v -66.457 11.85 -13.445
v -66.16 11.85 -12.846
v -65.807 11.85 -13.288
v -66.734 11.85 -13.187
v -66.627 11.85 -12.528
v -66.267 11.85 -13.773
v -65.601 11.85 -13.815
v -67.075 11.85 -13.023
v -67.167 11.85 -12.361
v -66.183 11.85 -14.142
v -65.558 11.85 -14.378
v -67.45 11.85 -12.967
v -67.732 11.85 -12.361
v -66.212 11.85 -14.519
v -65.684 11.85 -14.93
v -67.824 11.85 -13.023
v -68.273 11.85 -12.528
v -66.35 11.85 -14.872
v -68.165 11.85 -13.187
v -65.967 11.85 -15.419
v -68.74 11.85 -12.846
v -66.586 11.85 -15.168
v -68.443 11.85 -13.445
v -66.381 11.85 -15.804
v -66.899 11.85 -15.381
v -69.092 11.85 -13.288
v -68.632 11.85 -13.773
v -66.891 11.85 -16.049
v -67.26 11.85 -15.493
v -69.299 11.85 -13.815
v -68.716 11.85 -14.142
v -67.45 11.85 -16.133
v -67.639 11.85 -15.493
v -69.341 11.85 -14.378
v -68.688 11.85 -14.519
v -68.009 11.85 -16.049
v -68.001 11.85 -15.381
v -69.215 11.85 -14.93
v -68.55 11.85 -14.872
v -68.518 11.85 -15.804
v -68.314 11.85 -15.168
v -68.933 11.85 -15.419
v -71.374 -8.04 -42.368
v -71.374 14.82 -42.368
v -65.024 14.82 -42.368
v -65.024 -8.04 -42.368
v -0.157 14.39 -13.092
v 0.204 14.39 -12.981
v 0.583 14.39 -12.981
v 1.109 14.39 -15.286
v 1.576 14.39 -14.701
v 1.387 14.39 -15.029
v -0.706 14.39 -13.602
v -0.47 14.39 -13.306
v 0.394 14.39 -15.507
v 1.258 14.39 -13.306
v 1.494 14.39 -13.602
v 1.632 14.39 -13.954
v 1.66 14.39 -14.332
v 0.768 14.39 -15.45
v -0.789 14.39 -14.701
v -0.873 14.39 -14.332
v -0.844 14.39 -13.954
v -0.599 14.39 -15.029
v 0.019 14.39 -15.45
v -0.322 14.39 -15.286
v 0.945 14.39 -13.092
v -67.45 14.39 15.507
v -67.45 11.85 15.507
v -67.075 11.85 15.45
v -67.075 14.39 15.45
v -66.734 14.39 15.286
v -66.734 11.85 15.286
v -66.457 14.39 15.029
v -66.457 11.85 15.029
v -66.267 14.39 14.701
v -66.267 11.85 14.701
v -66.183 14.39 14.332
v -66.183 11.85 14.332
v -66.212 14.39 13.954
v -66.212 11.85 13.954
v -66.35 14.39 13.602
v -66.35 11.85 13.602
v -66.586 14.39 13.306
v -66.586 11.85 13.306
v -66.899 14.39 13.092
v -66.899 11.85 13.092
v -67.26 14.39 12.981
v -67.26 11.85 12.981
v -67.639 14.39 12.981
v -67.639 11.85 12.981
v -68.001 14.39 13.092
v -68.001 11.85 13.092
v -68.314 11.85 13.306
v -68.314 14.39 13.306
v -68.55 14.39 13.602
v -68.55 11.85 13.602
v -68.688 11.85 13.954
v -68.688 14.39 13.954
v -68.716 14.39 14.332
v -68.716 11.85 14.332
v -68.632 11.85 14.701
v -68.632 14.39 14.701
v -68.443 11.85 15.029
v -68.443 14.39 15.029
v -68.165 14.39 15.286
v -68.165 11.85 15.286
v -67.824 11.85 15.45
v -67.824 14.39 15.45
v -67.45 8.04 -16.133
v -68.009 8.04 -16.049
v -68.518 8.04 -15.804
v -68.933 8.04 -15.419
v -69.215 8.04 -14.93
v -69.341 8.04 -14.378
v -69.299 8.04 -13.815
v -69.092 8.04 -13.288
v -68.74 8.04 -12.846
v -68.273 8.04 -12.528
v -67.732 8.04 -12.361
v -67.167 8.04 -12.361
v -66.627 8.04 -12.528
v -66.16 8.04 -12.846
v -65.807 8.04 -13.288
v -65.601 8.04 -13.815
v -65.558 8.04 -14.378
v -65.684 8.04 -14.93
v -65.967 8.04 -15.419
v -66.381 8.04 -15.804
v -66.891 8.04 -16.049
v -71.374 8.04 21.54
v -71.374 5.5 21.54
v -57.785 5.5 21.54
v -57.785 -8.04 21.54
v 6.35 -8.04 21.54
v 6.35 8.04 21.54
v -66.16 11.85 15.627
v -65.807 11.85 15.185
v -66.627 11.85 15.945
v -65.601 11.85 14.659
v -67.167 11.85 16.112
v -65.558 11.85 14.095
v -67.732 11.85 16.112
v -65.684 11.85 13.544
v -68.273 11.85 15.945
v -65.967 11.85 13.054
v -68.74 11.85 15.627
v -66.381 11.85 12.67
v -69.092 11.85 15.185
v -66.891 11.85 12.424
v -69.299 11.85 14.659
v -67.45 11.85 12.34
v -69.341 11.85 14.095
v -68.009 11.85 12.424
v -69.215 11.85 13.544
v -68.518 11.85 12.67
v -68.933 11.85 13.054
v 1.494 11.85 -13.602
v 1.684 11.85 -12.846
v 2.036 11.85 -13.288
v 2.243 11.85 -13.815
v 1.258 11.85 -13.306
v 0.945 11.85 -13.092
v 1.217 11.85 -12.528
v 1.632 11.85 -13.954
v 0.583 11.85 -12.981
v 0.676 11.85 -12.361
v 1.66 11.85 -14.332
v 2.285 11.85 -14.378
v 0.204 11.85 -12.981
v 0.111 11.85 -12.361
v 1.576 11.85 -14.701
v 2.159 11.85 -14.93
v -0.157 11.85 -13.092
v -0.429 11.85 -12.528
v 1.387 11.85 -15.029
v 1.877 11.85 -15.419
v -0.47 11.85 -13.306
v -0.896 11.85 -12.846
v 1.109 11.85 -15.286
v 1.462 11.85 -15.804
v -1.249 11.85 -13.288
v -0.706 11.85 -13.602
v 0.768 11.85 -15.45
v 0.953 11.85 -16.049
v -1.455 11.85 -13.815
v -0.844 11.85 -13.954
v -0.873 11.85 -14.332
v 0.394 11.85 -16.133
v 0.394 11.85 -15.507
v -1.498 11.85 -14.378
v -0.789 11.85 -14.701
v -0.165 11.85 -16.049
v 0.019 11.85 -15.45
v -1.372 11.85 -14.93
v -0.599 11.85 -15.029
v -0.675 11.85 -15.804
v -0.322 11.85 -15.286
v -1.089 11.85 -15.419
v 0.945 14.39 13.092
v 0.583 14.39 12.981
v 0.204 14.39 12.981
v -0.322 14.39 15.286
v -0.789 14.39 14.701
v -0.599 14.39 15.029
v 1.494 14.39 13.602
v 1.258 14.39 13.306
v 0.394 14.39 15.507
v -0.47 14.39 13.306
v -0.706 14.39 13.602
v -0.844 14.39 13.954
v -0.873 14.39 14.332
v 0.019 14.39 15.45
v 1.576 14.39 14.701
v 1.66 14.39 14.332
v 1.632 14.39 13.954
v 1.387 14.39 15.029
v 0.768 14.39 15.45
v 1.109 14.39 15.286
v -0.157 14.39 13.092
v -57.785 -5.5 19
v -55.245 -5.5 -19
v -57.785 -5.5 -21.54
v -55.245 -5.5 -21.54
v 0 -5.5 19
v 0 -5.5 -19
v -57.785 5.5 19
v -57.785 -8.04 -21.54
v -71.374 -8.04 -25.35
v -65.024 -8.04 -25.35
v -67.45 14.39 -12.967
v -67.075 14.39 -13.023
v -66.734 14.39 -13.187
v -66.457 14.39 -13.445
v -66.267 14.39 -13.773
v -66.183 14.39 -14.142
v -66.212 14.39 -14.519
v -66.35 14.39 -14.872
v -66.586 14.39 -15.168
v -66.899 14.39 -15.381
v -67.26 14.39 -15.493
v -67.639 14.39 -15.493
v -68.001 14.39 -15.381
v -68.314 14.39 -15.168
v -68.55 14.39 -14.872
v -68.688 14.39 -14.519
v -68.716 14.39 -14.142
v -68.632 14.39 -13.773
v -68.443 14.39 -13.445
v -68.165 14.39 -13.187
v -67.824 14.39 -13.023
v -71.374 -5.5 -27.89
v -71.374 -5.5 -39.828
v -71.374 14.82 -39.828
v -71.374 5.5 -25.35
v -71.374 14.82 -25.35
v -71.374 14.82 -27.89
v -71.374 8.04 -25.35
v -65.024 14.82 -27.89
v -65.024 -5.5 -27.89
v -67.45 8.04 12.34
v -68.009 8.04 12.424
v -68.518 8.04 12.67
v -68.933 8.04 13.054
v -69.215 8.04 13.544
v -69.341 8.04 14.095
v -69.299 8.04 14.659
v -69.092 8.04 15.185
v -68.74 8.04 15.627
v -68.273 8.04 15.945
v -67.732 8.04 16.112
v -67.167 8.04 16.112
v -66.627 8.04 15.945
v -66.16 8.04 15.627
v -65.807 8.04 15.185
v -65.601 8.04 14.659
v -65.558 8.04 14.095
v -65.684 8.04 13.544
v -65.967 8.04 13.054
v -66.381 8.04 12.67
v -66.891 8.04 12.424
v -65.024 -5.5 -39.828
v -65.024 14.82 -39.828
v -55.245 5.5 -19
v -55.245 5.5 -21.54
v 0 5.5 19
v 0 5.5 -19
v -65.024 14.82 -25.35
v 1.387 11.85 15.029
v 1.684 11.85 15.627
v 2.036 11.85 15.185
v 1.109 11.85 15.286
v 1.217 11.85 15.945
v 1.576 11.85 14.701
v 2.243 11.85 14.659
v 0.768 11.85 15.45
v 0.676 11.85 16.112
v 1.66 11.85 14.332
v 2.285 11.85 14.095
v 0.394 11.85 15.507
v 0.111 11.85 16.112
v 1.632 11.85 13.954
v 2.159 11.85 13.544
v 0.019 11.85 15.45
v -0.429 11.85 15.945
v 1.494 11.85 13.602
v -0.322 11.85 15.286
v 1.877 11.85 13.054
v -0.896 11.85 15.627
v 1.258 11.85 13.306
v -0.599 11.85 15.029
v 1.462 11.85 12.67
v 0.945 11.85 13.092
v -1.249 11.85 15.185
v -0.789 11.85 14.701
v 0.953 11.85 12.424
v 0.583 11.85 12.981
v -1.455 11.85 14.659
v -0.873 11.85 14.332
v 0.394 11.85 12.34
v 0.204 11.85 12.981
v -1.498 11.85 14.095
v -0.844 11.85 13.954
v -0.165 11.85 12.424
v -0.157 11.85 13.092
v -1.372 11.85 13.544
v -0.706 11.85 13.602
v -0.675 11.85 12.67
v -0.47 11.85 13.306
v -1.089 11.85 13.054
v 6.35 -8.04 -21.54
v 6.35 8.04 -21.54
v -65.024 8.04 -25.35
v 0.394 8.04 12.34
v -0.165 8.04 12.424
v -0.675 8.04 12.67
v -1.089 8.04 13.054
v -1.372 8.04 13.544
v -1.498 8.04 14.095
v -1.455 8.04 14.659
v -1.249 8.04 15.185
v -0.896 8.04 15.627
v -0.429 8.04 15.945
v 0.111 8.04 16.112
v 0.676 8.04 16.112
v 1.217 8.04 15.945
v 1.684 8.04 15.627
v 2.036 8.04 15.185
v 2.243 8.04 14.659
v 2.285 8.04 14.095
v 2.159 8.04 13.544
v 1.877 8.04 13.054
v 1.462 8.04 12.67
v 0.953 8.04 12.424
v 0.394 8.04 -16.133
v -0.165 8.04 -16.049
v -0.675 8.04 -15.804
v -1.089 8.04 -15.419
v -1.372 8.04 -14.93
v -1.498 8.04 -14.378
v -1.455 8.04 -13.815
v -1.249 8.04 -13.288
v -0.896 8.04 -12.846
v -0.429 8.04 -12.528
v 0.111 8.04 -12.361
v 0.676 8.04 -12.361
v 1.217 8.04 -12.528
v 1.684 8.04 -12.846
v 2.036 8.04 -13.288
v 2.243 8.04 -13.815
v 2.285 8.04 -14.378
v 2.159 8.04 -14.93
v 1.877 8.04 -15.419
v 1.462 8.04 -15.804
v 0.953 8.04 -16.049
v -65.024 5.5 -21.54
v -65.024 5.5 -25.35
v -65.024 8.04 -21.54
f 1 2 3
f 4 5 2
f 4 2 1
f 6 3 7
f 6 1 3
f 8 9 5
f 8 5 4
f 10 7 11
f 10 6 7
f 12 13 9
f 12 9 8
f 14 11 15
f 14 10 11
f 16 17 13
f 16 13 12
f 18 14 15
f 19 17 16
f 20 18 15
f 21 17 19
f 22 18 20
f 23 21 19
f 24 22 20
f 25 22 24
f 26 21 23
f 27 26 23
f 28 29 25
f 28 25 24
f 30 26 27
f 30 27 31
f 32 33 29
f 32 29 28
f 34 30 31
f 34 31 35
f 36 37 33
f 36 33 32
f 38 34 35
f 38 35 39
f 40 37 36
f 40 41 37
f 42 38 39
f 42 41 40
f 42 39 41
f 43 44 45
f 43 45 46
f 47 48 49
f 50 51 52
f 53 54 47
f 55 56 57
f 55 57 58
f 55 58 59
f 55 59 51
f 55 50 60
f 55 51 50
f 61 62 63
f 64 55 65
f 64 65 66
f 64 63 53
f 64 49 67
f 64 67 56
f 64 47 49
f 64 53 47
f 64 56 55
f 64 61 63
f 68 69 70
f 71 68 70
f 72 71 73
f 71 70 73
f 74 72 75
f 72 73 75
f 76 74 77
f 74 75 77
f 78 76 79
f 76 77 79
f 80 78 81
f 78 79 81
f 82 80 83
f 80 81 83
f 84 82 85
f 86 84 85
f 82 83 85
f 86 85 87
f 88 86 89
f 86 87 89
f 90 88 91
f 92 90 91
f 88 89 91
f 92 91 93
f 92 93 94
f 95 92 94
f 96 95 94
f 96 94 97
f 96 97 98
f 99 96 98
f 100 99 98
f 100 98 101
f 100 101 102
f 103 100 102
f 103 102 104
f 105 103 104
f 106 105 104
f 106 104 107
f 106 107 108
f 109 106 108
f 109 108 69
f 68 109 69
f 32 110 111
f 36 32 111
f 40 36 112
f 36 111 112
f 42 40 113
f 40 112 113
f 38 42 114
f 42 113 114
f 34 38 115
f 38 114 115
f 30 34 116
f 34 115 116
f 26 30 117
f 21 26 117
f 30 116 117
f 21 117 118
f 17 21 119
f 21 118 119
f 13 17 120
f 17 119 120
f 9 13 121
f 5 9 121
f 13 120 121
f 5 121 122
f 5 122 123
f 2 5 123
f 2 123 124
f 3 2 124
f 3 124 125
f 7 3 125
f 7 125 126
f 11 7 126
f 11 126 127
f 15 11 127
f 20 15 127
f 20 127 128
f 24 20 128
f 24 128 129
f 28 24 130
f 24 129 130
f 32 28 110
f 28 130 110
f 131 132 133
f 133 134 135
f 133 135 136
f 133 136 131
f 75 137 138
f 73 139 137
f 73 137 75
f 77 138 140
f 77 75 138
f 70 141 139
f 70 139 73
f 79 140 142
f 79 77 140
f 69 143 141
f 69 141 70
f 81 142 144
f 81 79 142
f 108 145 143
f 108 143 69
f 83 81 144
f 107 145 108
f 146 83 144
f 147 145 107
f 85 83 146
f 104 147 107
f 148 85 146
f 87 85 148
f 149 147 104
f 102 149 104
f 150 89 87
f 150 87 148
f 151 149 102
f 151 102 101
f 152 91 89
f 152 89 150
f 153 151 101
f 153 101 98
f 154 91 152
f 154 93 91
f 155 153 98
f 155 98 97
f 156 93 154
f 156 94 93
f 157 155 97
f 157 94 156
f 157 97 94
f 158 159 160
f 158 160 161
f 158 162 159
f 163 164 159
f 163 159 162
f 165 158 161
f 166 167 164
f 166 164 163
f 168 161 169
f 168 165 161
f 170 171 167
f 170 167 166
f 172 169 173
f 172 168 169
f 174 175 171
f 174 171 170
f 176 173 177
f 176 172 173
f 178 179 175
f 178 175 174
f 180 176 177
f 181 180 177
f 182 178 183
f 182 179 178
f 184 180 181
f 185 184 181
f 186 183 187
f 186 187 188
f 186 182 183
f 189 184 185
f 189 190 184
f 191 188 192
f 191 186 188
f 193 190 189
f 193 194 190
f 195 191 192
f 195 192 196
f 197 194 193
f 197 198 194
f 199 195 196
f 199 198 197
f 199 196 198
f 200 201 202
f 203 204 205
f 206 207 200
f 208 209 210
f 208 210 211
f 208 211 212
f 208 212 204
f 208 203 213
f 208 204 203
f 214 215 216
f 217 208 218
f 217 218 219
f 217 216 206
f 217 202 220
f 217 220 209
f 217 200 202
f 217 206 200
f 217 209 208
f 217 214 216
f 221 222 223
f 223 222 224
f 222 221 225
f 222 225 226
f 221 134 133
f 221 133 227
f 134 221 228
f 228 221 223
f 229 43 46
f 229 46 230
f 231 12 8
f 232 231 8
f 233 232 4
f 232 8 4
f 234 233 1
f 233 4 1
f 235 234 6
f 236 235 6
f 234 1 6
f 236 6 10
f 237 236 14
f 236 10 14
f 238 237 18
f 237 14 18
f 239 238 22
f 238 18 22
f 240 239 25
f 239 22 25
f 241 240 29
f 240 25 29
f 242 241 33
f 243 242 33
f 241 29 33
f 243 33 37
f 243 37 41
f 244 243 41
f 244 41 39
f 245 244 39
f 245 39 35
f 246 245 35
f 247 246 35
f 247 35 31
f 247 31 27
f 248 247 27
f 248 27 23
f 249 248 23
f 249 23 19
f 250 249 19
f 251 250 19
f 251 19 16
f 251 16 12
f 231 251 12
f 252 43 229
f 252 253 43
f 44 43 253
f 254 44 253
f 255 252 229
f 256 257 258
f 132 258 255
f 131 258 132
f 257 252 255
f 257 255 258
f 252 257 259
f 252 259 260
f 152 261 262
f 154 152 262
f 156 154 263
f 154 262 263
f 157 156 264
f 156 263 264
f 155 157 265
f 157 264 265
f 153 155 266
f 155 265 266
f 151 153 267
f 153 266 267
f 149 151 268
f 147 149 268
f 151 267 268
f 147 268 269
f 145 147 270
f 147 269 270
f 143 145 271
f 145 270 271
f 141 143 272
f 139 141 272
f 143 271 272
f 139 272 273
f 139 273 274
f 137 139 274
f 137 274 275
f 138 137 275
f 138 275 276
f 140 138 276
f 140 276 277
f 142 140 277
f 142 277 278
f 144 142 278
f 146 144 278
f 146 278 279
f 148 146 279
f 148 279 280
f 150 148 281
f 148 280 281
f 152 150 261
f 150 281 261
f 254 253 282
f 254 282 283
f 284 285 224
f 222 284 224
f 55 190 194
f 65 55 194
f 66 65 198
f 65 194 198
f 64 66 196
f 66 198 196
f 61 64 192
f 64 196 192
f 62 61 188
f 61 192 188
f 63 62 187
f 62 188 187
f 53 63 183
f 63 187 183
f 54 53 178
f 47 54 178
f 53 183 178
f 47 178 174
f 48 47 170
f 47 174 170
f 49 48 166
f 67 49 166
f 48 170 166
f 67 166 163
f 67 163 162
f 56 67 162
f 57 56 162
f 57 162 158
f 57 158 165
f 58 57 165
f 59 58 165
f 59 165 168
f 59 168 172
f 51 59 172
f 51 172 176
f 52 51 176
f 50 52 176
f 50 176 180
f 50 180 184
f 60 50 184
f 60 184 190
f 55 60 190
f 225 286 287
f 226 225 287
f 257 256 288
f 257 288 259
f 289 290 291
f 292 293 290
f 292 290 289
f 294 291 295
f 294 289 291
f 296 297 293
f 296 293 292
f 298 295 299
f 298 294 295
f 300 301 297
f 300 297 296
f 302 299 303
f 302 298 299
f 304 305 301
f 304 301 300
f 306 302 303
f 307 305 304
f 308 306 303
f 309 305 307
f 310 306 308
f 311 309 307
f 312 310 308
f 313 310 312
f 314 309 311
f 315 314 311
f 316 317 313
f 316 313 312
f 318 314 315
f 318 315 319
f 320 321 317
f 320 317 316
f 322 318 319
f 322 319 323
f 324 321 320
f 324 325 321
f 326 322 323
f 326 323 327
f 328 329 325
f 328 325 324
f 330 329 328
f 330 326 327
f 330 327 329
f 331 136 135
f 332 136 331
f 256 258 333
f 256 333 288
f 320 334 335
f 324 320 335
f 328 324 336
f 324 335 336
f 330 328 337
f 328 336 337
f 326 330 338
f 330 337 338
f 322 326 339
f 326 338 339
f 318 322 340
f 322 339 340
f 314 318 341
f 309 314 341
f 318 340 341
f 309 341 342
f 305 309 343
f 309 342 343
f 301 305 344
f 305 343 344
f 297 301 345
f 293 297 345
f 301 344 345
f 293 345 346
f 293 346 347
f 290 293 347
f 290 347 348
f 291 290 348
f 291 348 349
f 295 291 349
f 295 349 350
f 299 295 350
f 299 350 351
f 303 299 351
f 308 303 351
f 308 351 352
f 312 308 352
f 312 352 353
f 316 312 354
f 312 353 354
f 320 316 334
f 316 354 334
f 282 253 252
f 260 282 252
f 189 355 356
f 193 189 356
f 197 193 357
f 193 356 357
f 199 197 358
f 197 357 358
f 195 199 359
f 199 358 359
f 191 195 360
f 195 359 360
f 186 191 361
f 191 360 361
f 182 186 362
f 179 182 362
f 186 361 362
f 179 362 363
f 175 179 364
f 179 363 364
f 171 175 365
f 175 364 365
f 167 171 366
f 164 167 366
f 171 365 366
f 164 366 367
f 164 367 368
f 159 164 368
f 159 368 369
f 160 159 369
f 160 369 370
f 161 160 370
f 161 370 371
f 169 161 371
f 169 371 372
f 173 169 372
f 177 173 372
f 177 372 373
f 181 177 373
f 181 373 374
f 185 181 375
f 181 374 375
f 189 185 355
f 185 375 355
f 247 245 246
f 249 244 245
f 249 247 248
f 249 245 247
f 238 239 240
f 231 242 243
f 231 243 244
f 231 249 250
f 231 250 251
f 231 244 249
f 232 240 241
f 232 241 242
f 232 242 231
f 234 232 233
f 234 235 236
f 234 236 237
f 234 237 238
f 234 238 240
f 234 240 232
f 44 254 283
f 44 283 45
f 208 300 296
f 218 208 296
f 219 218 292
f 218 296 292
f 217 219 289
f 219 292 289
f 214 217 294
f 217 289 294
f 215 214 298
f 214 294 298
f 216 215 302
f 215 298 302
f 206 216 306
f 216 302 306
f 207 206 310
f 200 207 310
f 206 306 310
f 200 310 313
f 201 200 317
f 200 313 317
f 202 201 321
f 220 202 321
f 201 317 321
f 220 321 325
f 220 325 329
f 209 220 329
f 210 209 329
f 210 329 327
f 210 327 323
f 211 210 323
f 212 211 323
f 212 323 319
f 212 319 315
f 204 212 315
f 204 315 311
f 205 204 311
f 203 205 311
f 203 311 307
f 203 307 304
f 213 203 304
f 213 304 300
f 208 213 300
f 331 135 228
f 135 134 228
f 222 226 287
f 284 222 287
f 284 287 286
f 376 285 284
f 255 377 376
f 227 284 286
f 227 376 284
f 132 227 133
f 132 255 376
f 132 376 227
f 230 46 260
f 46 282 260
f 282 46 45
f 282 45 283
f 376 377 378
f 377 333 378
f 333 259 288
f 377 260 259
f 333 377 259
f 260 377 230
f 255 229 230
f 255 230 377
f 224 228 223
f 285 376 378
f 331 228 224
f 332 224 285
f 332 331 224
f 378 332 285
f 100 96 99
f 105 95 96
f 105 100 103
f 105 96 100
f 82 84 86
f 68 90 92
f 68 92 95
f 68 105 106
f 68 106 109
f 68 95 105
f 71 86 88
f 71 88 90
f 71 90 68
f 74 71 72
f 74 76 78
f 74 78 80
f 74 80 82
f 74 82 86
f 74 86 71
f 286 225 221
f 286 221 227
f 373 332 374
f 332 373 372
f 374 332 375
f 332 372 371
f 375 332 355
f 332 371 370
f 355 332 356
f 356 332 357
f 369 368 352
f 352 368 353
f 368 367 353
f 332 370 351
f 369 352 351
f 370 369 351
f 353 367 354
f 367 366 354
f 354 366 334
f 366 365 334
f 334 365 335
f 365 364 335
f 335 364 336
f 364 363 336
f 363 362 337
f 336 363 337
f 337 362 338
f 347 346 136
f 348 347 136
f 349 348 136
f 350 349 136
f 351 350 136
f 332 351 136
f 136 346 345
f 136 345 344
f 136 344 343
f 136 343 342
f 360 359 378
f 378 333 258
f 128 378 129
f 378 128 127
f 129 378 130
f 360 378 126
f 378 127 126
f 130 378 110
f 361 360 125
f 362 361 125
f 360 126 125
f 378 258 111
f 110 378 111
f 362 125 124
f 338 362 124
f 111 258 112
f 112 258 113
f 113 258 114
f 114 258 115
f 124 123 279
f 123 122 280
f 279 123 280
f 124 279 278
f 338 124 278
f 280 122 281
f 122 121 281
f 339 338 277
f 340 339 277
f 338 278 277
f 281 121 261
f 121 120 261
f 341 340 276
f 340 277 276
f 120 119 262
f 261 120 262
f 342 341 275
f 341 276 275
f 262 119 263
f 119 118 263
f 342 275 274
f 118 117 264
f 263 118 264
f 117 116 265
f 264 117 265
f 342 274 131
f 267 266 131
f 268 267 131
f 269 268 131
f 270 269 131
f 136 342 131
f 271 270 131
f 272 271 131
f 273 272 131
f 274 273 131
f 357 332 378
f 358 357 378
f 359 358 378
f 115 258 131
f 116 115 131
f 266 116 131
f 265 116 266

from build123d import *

# Parameters (mm, degrees)
SKETCH1_W            = 43.08
SKETCH1_H            = 16.08
SKETCH1_W_2          = 38
SKETCH1_H_2          = 11
BOSS_EXTRUDE1_DEPTH  = 57.785
SKETCH1_2_W          = 43.08
SKETCH1_2_H          = 16.08
BOSS_EXTRUDE2_DEPTH  = 2.54
CUT_EXTRUDE2_DEPTH   = 2.54
SKETCH5_W            = 72.136
SKETCH5_H            = 43.08
BOSS_EXTRUDE8_DEPTH  = 2.54
SKETCH5_6_R          = 1.27
BOSS_EXTRUDE9_DEPTH  = 6.35
SKETCH5_8_R          = 1.896612794
SKETCH5_8_R_2        = 1.27
BOSS_EXTRUDE10_DEPTH = 3.81
SKETCH6_W            = 43.08
SKETCH6_H            = 16.08
BOSS_EXTRUDE11_DEPTH = 3.81
SKETCH7_W            = 43.08
SKETCH7_H            = 2.54
BOSS_EXTRUDE12_DEPTH = 1.778
SKETCH8_W            = 3.81
SKETCH8_H            = 2.54
BOSS_EXTRUDE15_DEPTH = 6.35
BOSS_EXTRUDE16_DEPTH = 6.35


with BuildPart() as part:
    # Sketch1 → Boss-Extrude1 (new body)
    with BuildSketch(Plane(origin=(0, 0, 0), x_dir=(0, 0, -1), z_dir=(1, 0, 0))):
        Rectangle(SKETCH1_W, SKETCH1_H)
        Rectangle(SKETCH1_W_2, SKETCH1_H_2, mode=Mode.SUBTRACT)
    extrude(amount=-BOSS_EXTRUDE1_DEPTH)

    # Sketch1<2> → Boss-Extrude2 (add)
    with BuildSketch(Plane(origin=(0, 0, 0), x_dir=(0, 0, -1), z_dir=(1, 0, 0))):
        Rectangle(SKETCH1_2_W, SKETCH1_2_H)
    extrude(amount=BOSS_EXTRUDE2_DEPTH)

    # Sketch3 → Cut-Extrude2 (cut)
    with BuildSketch(Plane(origin=(0, 0, -21.54), x_dir=(-1, 0, 0), z_dir=(0, 0, -1))):
        Polygon((55.245, 2.921), (55.245, -5.5), (57.785, -5.5), (57.785, 2.96), (57.785, 5.5), (55.245, 5.5), align=None)
    extrude(amount=-CUT_EXTRUDE2_DEPTH, mode=Mode.SUBTRACT)

    # Sketch5 → Boss-Extrude8 (add)
    with BuildSketch(Plane(origin=(0, 8.04, 0), x_dir=(1, 0, 0), z_dir=(0, 1, 0))):
        with Locations((-33.528, 0)):
            Rectangle(SKETCH5_W, SKETCH5_H)
    extrude(amount=-BOSS_EXTRUDE8_DEPTH)

    # Sketch5<6> → Boss-Extrude9 (add)
    with BuildSketch(Plane(origin=(0, 8.04, 0), x_dir=(1, 0, 0), z_dir=(0, 1, 0))):
        with Locations((-67.4497, 14.236700027)):
            Circle(SKETCH5_6_R)
        with Locations((-67.4497, -14.236700027)):
            Circle(SKETCH5_6_R)
        with Locations((0.3937, -14.236700027)):
            Circle(SKETCH5_6_R)
        with Locations((0.3937, 14.236700027)):
            Circle(SKETCH5_6_R)
    extrude(amount=BOSS_EXTRUDE9_DEPTH)

    # Sketch5<8> → Boss-Extrude10 (add)
    # profile 1 of 4: a face of its own
    with BuildSketch(Plane(origin=(0, 8.04, 0), x_dir=(1, 0, 0), z_dir=(0, 1, 0))):
        with Locations((-67.4497, -14.236700027)):
            Circle(SKETCH5_8_R)
    # profile 2 of 4: a face of its own
    with BuildSketch(Plane(origin=(0, 8.04, 0), x_dir=(1, 0, 0), z_dir=(0, 1, 0))):
        with Locations((0.3937, -14.236700027)):
            Circle(SKETCH5_8_R)
    # profile 3 of 4: a face of its own
    with BuildSketch(Plane(origin=(0, 8.04, 0), x_dir=(1, 0, 0), z_dir=(0, 1, 0))):
        with Locations((0.3937, 14.236700027)):
            Circle(SKETCH5_8_R)
    # profile 4 of 4: a face of its own
    with BuildSketch(Plane(origin=(0, 8.04, 0), x_dir=(1, 0, 0), z_dir=(0, 1, 0))):
        with Locations((-67.4497, 14.236700027)):
            Circle(SKETCH5_8_R)
        with Locations((-67.4497, 14.236700027)):
            Circle(SKETCH5_8_R_2, mode=Mode.SUBTRACT)
    extrude(amount=BOSS_EXTRUDE10_DEPTH)

    # Sketch6 → Boss-Extrude11 (add)
    with BuildSketch(Plane(origin=(2.54, 0, 0), x_dir=(0, 0, -1), z_dir=(1, 0, 0))):
        Rectangle(SKETCH6_W, SKETCH6_H)
    extrude(amount=BOSS_EXTRUDE11_DEPTH)

    # Sketch7 → Boss-Extrude12 (add)
    with BuildSketch(Plane.ZY.offset(69.596)):
        with Locations((0, 6.77)):
            Rectangle(SKETCH7_W, SKETCH7_H)
    extrude(amount=BOSS_EXTRUDE12_DEPTH)

    # Sketch8 → Boss-Extrude15 (add)
    with BuildSketch(Plane.ZY.offset(71.374)):
        with Locations((-23.445, 6.77)):
            Rectangle(SKETCH8_W, SKETCH8_H)
    extrude(amount=-BOSS_EXTRUDE15_DEPTH)

    # Sketch8<5> → Boss-Extrude16 (add)
    with BuildSketch(Plane.ZY.offset(71.374)):
        Polygon((-25.35, 14.82), (-27.89, 14.82), (-27.89, -5.5), (-39.828, -5.5), (-39.828, 14.82), (-42.368, 14.82), (-42.368, -8.04), (-25.35, -8.04), align=None)
    extrude(amount=-BOSS_EXTRUDE16_DEPTH)


solid = part.part
